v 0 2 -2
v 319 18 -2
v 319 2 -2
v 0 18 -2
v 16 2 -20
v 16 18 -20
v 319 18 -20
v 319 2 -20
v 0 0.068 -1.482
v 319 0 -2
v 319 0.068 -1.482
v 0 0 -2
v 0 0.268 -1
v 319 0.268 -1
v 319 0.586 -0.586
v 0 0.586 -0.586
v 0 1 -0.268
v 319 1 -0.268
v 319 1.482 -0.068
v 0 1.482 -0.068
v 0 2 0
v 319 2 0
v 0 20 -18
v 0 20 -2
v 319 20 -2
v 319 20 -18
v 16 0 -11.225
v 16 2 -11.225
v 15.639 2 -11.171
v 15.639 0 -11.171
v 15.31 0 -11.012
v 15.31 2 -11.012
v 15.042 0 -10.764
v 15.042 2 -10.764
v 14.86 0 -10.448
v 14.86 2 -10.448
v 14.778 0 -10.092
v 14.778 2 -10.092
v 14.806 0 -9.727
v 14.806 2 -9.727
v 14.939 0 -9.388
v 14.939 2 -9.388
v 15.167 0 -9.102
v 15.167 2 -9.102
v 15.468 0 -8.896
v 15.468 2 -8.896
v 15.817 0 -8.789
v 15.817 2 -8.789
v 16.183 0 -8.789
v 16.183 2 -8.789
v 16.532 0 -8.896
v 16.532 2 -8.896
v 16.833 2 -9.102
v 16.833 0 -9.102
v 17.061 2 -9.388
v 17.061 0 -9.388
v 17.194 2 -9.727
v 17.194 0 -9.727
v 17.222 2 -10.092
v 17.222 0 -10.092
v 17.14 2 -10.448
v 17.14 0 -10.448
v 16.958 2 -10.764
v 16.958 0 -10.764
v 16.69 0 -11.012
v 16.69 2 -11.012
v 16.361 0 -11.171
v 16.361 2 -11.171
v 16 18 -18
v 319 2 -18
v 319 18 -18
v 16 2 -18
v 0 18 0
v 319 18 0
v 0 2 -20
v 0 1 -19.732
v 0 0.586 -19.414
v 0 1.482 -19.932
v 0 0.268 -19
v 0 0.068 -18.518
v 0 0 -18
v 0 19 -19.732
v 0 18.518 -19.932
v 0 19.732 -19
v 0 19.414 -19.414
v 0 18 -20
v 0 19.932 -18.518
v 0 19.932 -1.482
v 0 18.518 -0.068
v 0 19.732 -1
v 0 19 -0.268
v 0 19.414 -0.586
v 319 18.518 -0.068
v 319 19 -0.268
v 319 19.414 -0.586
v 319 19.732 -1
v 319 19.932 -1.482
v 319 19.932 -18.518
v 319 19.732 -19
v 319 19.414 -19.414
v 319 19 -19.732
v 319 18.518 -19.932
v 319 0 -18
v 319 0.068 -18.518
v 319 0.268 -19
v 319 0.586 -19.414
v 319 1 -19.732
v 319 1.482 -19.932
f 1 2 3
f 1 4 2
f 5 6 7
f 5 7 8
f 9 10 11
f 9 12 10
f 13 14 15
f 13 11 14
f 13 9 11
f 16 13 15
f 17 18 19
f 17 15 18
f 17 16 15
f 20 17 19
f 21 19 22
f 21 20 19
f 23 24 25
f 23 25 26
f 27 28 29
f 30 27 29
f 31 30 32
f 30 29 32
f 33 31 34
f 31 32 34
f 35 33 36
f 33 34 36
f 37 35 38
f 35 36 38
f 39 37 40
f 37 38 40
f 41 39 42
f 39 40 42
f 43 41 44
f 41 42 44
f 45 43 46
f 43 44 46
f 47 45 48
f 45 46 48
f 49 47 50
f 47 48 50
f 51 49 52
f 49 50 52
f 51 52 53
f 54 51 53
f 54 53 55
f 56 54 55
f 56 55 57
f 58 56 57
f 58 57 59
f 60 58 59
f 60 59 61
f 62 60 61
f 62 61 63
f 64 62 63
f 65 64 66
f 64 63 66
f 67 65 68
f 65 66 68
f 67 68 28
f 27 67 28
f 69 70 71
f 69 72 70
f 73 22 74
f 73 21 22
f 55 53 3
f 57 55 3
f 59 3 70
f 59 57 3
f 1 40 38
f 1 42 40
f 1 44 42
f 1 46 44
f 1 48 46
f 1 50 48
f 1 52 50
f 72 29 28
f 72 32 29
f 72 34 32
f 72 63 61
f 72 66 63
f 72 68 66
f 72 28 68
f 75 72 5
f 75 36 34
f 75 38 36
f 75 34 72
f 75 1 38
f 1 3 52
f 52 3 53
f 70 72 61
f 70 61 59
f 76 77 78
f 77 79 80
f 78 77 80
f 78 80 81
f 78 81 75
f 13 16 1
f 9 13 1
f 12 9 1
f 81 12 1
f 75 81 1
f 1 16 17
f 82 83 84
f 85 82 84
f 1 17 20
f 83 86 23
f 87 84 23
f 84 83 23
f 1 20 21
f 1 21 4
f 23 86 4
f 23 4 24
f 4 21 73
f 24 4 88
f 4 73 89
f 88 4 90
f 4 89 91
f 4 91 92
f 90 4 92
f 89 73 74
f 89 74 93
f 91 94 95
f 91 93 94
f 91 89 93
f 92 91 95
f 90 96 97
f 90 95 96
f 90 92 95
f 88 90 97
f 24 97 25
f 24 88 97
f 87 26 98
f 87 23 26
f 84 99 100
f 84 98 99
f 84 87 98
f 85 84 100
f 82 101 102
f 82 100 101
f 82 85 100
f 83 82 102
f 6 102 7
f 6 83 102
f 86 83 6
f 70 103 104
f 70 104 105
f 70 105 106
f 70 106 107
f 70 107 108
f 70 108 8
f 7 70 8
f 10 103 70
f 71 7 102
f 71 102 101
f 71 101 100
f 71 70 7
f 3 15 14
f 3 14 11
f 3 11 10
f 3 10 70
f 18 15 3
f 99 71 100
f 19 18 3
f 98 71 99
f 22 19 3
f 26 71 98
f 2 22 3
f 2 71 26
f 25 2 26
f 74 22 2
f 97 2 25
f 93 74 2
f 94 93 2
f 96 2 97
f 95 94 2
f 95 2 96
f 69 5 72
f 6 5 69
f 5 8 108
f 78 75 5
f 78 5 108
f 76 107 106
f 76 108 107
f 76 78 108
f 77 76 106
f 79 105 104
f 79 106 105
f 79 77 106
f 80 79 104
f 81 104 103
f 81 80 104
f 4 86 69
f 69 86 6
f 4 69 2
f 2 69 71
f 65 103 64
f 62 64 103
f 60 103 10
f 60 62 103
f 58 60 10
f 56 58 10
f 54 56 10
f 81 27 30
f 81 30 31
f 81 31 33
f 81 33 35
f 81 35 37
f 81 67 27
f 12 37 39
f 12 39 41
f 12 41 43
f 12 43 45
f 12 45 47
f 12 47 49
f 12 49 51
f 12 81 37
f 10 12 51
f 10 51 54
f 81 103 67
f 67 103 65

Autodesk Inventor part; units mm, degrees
ref_plane "YZ Plane" through (0, 0, 0) normal (1, 0, 0) x (0, 1, 0)
ref_plane "XZ Plane" through (0, 0, 0) normal (0, 1, 0) x (-1, 0, 0)
ref_plane "XY Plane" through (0, 0, 0) normal (0, 0, 1) x (1, 0, 0)
sketch "Sketch1" plane through (0, 0, 0) normal (1, 0, 0) x (0, 1, 0)
  line L0 (2, 0) -> (18, 0)
  line L1 (20, -2) -> (20, -18)
  line L2 (18, -20) -> (2, -20)
  line L3 (0, -18) -> (0, -2)
  line L4 (18, -18) -> (18, -2)
  line L5 (18, -2) -> (2, -2)
  line L6 (2, -2) -> (2, -18)
  line L7 (2, -18) -> (18, -18)
  arc A0 (20, -2) -> (18, 0) centre (18, -2) ccw
  arc A1 (18, -20) -> (20, -18) centre (18, -18) ccw
  arc A2 (0, -18) -> (2, -20) centre (2, -18) ccw
  arc A3 (2, 0) -> (0, -2) centre (2, -2) ccw
  point P0 (0, 0)
  point P1 (20, -20)
  point P2 (20, 0)
  point P3 (0, -20)
  dimension "d0" = 20
  dimension "d1" = 20
  dimension "d2" = 2
  dimension "d5" = 2
extrude "Extrusion1" add sketch "Sketch1" along normal blind 319
sketch "Sketch2" plane through (0, 0, -18) normal (0, -1, 0) x (1, 0, 0)
  line L0 (0, 16) -> (0, 0) projected
  line L1 (0, 0) -> (319, 0) projected
  point P0 (0, 18)
  point P1 (16, 8)
  dimension "d6" = 16
  dimension "d7" = 8
hole "Hole1" at (16, 0, -10) direction (0, 1, 0) diameter 2.45 depth 2
sketch "Sketch4" plane through (0, 2, -20) normal (0, 0, -1) x (-1, 0, 0)
  line L0 (0, 0) -> (0, 16) projected
  line L1 (0, 16) -> (-319, 16) projected
  line L2 (0, 0) -> (-16, 0)
  line L3 (-16, 0) -> (-16, 16)
  line L4 (-16, 16) -> (0, 16)
  line L5 (0, 16) -> (0, 0)
  point P0 (0, -2)
extrude "Extrusion3" cut sketch "Sketch4" against normal up to surface (2 mm away)
properties part number "rockerpivotarm"
